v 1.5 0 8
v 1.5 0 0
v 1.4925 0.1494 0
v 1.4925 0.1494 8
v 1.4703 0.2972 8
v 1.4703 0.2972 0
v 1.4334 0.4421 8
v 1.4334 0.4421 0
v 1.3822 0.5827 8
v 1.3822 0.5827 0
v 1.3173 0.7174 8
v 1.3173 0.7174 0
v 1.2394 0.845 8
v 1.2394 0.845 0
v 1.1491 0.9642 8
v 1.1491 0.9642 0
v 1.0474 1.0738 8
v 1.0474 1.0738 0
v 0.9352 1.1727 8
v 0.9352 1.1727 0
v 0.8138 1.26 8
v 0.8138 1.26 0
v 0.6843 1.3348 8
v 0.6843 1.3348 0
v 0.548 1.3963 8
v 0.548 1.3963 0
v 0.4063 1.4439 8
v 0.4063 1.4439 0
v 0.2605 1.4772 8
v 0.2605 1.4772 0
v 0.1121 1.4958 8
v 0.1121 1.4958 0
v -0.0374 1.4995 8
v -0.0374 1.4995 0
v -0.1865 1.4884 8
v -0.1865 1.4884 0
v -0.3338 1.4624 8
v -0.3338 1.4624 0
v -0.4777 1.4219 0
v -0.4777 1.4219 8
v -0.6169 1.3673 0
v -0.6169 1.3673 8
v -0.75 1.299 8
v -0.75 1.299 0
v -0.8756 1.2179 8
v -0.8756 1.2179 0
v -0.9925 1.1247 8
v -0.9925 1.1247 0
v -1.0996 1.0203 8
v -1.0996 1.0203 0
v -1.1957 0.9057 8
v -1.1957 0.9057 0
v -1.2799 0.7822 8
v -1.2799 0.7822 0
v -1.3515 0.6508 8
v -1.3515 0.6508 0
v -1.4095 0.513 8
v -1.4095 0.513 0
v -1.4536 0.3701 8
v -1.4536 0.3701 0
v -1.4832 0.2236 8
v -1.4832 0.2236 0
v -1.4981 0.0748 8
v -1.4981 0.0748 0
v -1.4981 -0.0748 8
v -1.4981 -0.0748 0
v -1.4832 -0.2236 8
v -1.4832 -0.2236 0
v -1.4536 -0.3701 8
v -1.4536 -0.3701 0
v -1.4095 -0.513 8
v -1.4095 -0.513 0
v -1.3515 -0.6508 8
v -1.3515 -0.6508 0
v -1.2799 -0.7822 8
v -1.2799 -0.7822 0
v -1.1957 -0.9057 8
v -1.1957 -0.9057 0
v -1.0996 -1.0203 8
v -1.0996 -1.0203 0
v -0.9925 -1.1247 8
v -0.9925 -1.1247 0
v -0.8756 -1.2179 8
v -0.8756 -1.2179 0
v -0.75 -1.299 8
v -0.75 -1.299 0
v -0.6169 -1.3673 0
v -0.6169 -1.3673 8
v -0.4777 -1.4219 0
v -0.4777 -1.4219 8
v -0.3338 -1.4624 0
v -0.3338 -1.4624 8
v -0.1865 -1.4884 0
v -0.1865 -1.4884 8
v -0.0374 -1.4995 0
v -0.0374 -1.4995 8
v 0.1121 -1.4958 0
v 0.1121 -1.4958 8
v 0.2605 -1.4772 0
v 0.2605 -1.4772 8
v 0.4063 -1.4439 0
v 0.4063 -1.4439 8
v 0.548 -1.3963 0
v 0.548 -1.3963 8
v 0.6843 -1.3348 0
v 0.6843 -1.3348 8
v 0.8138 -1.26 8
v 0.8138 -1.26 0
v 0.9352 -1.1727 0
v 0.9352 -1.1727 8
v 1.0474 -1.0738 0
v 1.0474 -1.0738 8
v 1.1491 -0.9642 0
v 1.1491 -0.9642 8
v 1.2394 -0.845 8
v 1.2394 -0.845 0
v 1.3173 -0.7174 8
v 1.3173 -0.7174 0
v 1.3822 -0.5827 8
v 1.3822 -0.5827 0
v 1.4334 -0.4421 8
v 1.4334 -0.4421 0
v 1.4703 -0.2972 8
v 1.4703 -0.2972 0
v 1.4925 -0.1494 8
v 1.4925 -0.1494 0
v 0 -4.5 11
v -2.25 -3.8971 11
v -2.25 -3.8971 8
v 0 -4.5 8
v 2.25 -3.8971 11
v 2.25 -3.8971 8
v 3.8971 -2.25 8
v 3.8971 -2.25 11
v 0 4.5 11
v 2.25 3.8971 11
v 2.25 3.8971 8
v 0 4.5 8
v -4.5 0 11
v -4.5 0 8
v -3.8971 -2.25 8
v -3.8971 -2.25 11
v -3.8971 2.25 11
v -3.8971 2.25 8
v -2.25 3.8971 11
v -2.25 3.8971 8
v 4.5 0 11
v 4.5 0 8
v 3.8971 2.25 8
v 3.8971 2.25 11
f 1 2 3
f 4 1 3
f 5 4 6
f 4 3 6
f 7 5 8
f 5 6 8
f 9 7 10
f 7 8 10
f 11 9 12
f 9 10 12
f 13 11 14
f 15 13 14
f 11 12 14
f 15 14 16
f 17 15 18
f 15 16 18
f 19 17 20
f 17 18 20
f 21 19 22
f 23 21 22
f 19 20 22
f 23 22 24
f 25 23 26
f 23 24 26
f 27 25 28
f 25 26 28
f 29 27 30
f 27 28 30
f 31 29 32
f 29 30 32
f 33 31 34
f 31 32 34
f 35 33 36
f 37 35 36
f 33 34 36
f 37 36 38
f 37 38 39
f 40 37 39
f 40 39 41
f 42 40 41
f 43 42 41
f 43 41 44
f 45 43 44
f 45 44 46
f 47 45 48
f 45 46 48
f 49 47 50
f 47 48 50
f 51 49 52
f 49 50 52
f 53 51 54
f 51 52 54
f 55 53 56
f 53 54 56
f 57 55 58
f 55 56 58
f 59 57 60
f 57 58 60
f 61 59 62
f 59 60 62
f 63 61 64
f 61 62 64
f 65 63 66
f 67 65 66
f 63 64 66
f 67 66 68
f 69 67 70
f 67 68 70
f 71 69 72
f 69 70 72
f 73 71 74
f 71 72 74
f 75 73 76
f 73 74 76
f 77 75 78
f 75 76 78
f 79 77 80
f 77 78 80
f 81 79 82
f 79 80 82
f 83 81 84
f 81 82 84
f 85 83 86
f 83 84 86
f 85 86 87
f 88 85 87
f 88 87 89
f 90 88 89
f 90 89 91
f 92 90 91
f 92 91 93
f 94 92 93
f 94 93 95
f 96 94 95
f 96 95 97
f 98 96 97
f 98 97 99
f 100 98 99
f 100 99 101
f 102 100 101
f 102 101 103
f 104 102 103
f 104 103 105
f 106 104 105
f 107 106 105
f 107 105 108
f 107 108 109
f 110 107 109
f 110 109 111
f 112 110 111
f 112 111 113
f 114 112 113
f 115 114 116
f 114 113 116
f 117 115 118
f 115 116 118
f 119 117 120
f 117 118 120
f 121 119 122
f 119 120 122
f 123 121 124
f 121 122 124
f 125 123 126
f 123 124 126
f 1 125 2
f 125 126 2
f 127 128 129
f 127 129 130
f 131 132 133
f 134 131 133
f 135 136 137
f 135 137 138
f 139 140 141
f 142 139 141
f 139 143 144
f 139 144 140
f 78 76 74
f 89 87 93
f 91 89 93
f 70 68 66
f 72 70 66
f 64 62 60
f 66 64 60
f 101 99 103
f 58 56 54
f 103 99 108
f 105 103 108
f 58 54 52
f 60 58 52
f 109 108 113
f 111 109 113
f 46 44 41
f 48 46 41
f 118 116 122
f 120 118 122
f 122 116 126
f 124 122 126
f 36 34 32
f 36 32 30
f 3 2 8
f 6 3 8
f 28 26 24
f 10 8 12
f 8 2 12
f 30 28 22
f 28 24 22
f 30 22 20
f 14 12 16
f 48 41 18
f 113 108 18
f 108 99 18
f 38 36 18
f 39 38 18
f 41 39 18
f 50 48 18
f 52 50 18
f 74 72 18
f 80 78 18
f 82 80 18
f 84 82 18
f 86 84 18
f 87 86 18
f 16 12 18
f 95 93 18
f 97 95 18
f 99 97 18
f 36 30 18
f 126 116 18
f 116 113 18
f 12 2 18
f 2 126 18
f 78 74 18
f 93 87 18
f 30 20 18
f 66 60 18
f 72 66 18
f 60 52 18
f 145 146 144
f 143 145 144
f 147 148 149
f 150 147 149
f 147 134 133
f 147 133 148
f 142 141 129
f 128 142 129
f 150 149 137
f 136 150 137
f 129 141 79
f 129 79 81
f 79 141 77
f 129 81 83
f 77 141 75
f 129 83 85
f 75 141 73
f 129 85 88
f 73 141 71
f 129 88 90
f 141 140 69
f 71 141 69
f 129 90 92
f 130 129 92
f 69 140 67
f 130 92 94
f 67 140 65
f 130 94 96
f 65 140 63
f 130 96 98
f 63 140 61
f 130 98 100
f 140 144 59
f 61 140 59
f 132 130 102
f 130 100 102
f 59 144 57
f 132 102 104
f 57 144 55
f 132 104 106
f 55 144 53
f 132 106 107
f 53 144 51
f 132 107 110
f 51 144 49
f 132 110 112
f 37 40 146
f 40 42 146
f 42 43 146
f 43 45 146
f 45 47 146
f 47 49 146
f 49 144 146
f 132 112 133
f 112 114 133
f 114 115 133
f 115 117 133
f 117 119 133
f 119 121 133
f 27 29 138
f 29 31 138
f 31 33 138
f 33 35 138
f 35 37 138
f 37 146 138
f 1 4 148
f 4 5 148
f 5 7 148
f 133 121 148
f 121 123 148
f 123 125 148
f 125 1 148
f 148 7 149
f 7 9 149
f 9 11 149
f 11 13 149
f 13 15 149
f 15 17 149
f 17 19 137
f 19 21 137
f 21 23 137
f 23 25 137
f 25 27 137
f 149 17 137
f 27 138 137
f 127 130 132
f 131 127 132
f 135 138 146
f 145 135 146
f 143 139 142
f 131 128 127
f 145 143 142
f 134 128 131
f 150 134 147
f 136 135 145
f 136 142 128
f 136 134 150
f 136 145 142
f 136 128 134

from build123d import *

# Parameters (mm, degrees)
SKETCH_1_R       = 1.5
M3X8_DEPTH       = 8
EXTRUDE_START    = 8
EXTRUDE_D9_DEPTH = 3


with BuildPart() as part:
    # 草图1 → M3x8简化螺杆 (new body)
    with BuildSketch(Plane.XY):
        Circle(SKETCH_1_R)
    extrude(amount=M3X8_DEPTH)

    # 草图2 → D9十二边手拧头 (add)
    with BuildSketch(Plane.XY.offset(EXTRUDE_START)):
        Polygon((4.5, 0), (3.897114317, 2.25), (2.25, 3.897114317), (0, 4.5), (-2.25, 3.897114317), (-3.897114317, 2.25), (-4.5, 0), (-3.897114317, -2.25), (-2.25, -3.897114317), (0, -4.5), (2.25, -3.897114317), (3.897114317, -2.25), align=None)
    extrude(amount=EXTRUDE_D9_DEPTH)


solid = part.part
